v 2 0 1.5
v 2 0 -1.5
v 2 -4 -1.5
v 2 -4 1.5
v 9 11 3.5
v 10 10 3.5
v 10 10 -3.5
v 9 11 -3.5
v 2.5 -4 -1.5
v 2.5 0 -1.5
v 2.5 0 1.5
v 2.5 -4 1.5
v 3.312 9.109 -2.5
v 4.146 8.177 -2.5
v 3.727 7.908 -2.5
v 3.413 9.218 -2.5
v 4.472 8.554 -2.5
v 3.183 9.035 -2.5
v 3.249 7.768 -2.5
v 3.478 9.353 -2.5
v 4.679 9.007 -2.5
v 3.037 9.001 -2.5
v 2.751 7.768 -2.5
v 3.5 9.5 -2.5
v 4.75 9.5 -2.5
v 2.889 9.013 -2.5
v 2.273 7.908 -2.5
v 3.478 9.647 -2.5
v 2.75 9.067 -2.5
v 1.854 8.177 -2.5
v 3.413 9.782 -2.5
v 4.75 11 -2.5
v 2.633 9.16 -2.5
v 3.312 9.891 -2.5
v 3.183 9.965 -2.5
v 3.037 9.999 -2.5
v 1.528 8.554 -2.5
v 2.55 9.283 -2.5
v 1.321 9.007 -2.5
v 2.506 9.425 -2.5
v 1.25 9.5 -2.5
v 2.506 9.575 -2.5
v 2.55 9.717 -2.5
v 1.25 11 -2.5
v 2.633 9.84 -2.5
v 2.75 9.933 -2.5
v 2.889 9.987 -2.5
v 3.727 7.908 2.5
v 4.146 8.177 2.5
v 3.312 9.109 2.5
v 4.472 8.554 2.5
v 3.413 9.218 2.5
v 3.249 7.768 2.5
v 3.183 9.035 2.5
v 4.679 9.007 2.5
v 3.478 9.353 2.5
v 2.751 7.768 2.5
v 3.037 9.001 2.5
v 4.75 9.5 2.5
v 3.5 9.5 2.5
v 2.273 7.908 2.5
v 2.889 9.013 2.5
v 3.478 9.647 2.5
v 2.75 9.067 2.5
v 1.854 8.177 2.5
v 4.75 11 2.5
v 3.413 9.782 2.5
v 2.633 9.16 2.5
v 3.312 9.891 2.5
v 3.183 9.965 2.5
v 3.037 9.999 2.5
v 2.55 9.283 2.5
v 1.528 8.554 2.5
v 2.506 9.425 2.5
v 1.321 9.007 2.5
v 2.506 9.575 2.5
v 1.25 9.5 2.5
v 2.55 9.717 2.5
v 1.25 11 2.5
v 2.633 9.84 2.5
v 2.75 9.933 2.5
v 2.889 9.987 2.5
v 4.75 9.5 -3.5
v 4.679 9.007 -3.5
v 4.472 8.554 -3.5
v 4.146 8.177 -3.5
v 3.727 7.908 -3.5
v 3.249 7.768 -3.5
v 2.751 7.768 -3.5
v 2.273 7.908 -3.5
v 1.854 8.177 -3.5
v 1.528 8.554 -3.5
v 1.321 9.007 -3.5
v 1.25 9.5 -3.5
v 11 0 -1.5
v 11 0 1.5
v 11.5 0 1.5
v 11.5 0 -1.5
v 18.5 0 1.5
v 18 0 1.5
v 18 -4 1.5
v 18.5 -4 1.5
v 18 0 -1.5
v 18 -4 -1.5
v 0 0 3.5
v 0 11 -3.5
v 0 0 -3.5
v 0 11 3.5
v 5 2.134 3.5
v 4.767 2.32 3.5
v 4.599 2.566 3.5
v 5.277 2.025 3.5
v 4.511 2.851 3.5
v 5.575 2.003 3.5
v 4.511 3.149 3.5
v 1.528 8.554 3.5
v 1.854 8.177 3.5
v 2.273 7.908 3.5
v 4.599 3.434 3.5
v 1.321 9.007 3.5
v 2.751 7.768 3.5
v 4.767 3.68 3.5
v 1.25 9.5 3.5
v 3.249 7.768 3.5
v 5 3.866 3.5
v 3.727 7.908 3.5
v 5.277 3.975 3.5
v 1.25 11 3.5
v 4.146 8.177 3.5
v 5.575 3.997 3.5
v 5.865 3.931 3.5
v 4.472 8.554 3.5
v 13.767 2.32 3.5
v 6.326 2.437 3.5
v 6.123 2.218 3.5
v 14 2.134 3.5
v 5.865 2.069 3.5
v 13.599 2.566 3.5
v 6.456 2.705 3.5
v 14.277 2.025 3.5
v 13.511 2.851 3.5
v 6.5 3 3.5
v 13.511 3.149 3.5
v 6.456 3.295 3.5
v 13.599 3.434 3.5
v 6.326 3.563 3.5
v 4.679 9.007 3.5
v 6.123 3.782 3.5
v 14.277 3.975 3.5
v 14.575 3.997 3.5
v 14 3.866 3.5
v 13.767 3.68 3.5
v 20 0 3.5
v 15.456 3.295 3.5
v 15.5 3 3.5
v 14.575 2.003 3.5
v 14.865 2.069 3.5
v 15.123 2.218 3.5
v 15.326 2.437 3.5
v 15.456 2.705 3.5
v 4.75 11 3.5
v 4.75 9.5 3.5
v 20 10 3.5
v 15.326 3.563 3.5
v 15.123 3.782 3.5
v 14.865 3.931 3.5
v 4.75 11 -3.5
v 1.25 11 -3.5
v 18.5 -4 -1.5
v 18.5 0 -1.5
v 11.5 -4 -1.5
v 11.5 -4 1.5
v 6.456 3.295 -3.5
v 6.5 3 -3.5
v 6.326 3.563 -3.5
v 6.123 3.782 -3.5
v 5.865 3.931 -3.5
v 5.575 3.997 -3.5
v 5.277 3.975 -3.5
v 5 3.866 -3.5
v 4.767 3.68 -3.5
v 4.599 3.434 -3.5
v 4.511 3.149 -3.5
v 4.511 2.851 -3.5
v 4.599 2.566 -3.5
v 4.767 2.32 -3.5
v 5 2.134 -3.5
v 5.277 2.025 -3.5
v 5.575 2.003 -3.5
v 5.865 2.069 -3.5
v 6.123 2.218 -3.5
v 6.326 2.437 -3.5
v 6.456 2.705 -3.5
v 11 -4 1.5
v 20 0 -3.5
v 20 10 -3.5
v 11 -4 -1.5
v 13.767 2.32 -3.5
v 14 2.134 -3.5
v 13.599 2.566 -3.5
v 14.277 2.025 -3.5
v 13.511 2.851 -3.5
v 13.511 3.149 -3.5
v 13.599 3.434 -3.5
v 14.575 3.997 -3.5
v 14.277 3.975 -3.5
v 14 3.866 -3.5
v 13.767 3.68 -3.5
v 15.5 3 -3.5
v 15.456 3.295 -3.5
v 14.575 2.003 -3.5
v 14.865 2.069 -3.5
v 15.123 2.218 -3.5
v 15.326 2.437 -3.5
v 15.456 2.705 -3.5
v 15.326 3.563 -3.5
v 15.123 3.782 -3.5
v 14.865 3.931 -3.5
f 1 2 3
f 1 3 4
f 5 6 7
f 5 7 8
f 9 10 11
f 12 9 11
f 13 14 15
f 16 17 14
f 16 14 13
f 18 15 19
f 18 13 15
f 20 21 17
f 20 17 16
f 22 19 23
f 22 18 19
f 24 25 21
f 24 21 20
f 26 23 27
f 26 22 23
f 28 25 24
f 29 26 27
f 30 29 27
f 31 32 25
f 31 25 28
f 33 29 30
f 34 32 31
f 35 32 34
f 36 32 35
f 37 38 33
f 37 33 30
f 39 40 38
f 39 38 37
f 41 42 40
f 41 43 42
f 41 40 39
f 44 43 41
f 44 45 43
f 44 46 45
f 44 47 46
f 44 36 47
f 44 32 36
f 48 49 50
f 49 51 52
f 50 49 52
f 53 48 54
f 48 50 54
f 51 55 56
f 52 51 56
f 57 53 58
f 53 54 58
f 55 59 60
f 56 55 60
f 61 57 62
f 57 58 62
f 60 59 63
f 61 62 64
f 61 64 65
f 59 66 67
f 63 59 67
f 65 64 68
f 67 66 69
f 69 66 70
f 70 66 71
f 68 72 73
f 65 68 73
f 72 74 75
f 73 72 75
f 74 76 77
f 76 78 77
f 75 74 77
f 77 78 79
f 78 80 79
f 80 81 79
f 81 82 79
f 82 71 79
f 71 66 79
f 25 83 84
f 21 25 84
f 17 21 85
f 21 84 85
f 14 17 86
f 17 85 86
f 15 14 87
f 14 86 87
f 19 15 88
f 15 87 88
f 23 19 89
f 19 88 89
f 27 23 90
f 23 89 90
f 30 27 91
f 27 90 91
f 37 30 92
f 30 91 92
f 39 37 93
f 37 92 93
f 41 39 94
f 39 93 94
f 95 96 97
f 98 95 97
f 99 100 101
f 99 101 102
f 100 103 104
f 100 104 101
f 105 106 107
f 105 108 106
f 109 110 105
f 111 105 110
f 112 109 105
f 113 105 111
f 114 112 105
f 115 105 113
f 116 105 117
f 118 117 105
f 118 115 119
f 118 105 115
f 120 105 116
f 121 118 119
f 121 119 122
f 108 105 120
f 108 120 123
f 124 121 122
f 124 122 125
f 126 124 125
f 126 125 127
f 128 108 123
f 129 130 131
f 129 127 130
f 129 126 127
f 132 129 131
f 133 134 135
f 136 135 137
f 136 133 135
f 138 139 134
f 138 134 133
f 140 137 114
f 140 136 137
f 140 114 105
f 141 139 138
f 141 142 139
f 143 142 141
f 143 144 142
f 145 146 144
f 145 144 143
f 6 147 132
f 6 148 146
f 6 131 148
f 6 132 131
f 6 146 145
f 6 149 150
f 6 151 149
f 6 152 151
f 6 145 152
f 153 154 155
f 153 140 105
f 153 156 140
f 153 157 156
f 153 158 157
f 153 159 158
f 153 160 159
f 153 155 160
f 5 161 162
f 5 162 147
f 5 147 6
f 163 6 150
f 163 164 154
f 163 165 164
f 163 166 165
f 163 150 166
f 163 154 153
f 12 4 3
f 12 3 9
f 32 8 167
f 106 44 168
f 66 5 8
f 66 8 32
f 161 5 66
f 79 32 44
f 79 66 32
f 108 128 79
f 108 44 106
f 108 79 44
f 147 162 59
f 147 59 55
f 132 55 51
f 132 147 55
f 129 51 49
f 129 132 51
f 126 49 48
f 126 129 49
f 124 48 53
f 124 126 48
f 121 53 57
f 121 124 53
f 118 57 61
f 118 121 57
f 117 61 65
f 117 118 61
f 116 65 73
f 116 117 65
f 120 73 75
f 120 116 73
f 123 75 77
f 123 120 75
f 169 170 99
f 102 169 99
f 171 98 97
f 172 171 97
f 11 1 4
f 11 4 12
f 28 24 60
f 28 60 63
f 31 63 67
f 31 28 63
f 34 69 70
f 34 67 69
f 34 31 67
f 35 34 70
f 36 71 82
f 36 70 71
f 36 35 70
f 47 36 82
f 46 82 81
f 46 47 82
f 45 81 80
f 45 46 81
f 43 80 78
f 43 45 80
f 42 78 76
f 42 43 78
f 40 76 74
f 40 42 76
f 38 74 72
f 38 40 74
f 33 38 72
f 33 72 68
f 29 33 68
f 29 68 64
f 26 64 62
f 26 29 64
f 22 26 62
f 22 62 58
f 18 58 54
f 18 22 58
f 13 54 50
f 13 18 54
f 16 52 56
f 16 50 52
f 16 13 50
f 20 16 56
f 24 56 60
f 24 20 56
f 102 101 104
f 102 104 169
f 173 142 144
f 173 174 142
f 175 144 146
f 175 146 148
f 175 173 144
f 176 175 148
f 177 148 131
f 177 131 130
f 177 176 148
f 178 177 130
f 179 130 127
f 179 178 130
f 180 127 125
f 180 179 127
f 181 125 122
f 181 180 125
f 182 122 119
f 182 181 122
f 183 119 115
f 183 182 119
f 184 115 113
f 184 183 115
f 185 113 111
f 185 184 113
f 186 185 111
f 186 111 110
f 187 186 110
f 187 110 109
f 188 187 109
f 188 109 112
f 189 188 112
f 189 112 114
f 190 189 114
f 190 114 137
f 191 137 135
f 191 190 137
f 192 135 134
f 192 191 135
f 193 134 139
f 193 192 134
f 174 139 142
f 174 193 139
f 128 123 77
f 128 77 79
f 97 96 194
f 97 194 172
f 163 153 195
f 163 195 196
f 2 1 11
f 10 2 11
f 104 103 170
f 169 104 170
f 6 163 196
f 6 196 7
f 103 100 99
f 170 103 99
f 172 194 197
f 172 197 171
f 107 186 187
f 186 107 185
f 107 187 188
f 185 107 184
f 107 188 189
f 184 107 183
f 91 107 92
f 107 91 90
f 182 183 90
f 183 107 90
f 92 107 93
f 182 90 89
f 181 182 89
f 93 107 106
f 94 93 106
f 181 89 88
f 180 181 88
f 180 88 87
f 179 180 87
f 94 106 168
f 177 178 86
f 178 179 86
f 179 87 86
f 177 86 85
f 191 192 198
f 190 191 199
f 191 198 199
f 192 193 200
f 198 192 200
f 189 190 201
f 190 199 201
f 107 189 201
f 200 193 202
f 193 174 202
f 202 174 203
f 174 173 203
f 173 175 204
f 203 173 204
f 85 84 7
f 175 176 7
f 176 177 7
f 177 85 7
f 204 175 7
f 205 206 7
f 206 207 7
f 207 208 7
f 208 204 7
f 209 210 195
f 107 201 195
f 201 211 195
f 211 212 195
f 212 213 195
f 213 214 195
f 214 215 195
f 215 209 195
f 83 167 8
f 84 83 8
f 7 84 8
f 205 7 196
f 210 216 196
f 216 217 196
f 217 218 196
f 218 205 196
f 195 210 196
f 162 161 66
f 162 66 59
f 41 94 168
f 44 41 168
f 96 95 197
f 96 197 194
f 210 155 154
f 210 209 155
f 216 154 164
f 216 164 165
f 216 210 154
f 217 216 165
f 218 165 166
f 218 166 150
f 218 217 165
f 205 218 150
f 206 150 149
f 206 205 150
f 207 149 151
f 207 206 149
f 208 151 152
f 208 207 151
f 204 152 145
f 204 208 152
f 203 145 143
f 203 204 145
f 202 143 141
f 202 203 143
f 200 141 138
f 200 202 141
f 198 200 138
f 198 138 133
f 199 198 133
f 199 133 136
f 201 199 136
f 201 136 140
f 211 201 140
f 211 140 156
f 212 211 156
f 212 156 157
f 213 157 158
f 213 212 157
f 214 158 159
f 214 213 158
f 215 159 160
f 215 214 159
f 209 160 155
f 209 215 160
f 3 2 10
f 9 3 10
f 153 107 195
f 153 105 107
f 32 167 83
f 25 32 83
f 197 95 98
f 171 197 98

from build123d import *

# Parameters (mm, degrees)
ESQUISSE1_R             = 0.5
ESQUISSE1_R_2           = 1
BOSS_EXTRU_1_DEPTH      = 3.5
ESQUISSE2_W             = 0.5
ESQUISSE2_H             = 3
BOSS_EXTRU_2_DEPTH      = 4
BOSS_EXTRU_2_2_DEPTH    = 4
BOSS_EXTRU_2_3_DEPTH    = 4
ENL_V_MAT_EXTRU_1_DEPTH = 1


with BuildPart() as part:
    # Esquisse1 → Boss.-Extru.1 (new, symmetric)
    with BuildSketch(Plane.XY):
        Polygon((0, 0), (20, 0), (20, 10), (10, 10), (9, 11), (0, 11), align=None)
        with Locations((3, 9.5)):
            Circle(ESQUISSE1_R, mode=Mode.SUBTRACT)
        with Locations((5.5, 3)):
            Circle(ESQUISSE1_R_2, mode=Mode.SUBTRACT)
        with Locations((14.5, 3)):
            Circle(ESQUISSE1_R_2, mode=Mode.SUBTRACT)
    extrude(amount=BOSS_EXTRU_1_DEPTH, both=True)

    # Esquisse3 → Enlèv. mat.-Extru.1 (cut)
    with BuildSketch(Plane.XY.offset(3.5)):
        with BuildLine():
            Line((1.25, 9.5), (1.25, 11))
            ThreePointArc((1.25, 11), (3, 12.75), (4.75, 11))
            Line((4.75, 11), (4.75, 9.5))
            ThreePointArc((4.75, 9.5), (3, 7.75), (1.25, 9.5))
        make_face()
    enl_v_mat_extru_1 = extrude(amount=-ENL_V_MAT_EXTRU_1_DEPTH, mode=Mode.SUBTRACT)

    # Symétrie1: Enlèv. mat.-Extru.1 across plane
    add(enl_v_mat_extru_1.mirror(Plane.XY), mode=Mode.SUBTRACT)


with BuildPart() as body_2:
    # Esquisse2 → Boss.-Extru.2 (new body)
    with BuildSketch(Plane.XZ):
        with Locations((2.25, 0)):
            Rectangle(ESQUISSE2_W, ESQUISSE2_H)
    extrude(amount=BOSS_EXTRU_2_DEPTH)


with BuildPart() as body_3:
    # Esquisse2 → Boss.-Extru.2 2 (new body)
    with BuildSketch(Plane.XZ):
        with Locations((11.25, 0)):
            Rectangle(ESQUISSE2_W, ESQUISSE2_H)
    extrude(amount=BOSS_EXTRU_2_2_DEPTH)


with BuildPart() as body_4:
    # Esquisse2 → Boss.-Extru.2 3 (new body)
    with BuildSketch(Plane.XZ):
        with Locations((18.25, 0)):
            Rectangle(ESQUISSE2_W, ESQUISSE2_H)
    extrude(amount=BOSS_EXTRU_2_3_DEPTH)


solid = Compound([part.part, body_2.part, body_3.part, body_4.part])
